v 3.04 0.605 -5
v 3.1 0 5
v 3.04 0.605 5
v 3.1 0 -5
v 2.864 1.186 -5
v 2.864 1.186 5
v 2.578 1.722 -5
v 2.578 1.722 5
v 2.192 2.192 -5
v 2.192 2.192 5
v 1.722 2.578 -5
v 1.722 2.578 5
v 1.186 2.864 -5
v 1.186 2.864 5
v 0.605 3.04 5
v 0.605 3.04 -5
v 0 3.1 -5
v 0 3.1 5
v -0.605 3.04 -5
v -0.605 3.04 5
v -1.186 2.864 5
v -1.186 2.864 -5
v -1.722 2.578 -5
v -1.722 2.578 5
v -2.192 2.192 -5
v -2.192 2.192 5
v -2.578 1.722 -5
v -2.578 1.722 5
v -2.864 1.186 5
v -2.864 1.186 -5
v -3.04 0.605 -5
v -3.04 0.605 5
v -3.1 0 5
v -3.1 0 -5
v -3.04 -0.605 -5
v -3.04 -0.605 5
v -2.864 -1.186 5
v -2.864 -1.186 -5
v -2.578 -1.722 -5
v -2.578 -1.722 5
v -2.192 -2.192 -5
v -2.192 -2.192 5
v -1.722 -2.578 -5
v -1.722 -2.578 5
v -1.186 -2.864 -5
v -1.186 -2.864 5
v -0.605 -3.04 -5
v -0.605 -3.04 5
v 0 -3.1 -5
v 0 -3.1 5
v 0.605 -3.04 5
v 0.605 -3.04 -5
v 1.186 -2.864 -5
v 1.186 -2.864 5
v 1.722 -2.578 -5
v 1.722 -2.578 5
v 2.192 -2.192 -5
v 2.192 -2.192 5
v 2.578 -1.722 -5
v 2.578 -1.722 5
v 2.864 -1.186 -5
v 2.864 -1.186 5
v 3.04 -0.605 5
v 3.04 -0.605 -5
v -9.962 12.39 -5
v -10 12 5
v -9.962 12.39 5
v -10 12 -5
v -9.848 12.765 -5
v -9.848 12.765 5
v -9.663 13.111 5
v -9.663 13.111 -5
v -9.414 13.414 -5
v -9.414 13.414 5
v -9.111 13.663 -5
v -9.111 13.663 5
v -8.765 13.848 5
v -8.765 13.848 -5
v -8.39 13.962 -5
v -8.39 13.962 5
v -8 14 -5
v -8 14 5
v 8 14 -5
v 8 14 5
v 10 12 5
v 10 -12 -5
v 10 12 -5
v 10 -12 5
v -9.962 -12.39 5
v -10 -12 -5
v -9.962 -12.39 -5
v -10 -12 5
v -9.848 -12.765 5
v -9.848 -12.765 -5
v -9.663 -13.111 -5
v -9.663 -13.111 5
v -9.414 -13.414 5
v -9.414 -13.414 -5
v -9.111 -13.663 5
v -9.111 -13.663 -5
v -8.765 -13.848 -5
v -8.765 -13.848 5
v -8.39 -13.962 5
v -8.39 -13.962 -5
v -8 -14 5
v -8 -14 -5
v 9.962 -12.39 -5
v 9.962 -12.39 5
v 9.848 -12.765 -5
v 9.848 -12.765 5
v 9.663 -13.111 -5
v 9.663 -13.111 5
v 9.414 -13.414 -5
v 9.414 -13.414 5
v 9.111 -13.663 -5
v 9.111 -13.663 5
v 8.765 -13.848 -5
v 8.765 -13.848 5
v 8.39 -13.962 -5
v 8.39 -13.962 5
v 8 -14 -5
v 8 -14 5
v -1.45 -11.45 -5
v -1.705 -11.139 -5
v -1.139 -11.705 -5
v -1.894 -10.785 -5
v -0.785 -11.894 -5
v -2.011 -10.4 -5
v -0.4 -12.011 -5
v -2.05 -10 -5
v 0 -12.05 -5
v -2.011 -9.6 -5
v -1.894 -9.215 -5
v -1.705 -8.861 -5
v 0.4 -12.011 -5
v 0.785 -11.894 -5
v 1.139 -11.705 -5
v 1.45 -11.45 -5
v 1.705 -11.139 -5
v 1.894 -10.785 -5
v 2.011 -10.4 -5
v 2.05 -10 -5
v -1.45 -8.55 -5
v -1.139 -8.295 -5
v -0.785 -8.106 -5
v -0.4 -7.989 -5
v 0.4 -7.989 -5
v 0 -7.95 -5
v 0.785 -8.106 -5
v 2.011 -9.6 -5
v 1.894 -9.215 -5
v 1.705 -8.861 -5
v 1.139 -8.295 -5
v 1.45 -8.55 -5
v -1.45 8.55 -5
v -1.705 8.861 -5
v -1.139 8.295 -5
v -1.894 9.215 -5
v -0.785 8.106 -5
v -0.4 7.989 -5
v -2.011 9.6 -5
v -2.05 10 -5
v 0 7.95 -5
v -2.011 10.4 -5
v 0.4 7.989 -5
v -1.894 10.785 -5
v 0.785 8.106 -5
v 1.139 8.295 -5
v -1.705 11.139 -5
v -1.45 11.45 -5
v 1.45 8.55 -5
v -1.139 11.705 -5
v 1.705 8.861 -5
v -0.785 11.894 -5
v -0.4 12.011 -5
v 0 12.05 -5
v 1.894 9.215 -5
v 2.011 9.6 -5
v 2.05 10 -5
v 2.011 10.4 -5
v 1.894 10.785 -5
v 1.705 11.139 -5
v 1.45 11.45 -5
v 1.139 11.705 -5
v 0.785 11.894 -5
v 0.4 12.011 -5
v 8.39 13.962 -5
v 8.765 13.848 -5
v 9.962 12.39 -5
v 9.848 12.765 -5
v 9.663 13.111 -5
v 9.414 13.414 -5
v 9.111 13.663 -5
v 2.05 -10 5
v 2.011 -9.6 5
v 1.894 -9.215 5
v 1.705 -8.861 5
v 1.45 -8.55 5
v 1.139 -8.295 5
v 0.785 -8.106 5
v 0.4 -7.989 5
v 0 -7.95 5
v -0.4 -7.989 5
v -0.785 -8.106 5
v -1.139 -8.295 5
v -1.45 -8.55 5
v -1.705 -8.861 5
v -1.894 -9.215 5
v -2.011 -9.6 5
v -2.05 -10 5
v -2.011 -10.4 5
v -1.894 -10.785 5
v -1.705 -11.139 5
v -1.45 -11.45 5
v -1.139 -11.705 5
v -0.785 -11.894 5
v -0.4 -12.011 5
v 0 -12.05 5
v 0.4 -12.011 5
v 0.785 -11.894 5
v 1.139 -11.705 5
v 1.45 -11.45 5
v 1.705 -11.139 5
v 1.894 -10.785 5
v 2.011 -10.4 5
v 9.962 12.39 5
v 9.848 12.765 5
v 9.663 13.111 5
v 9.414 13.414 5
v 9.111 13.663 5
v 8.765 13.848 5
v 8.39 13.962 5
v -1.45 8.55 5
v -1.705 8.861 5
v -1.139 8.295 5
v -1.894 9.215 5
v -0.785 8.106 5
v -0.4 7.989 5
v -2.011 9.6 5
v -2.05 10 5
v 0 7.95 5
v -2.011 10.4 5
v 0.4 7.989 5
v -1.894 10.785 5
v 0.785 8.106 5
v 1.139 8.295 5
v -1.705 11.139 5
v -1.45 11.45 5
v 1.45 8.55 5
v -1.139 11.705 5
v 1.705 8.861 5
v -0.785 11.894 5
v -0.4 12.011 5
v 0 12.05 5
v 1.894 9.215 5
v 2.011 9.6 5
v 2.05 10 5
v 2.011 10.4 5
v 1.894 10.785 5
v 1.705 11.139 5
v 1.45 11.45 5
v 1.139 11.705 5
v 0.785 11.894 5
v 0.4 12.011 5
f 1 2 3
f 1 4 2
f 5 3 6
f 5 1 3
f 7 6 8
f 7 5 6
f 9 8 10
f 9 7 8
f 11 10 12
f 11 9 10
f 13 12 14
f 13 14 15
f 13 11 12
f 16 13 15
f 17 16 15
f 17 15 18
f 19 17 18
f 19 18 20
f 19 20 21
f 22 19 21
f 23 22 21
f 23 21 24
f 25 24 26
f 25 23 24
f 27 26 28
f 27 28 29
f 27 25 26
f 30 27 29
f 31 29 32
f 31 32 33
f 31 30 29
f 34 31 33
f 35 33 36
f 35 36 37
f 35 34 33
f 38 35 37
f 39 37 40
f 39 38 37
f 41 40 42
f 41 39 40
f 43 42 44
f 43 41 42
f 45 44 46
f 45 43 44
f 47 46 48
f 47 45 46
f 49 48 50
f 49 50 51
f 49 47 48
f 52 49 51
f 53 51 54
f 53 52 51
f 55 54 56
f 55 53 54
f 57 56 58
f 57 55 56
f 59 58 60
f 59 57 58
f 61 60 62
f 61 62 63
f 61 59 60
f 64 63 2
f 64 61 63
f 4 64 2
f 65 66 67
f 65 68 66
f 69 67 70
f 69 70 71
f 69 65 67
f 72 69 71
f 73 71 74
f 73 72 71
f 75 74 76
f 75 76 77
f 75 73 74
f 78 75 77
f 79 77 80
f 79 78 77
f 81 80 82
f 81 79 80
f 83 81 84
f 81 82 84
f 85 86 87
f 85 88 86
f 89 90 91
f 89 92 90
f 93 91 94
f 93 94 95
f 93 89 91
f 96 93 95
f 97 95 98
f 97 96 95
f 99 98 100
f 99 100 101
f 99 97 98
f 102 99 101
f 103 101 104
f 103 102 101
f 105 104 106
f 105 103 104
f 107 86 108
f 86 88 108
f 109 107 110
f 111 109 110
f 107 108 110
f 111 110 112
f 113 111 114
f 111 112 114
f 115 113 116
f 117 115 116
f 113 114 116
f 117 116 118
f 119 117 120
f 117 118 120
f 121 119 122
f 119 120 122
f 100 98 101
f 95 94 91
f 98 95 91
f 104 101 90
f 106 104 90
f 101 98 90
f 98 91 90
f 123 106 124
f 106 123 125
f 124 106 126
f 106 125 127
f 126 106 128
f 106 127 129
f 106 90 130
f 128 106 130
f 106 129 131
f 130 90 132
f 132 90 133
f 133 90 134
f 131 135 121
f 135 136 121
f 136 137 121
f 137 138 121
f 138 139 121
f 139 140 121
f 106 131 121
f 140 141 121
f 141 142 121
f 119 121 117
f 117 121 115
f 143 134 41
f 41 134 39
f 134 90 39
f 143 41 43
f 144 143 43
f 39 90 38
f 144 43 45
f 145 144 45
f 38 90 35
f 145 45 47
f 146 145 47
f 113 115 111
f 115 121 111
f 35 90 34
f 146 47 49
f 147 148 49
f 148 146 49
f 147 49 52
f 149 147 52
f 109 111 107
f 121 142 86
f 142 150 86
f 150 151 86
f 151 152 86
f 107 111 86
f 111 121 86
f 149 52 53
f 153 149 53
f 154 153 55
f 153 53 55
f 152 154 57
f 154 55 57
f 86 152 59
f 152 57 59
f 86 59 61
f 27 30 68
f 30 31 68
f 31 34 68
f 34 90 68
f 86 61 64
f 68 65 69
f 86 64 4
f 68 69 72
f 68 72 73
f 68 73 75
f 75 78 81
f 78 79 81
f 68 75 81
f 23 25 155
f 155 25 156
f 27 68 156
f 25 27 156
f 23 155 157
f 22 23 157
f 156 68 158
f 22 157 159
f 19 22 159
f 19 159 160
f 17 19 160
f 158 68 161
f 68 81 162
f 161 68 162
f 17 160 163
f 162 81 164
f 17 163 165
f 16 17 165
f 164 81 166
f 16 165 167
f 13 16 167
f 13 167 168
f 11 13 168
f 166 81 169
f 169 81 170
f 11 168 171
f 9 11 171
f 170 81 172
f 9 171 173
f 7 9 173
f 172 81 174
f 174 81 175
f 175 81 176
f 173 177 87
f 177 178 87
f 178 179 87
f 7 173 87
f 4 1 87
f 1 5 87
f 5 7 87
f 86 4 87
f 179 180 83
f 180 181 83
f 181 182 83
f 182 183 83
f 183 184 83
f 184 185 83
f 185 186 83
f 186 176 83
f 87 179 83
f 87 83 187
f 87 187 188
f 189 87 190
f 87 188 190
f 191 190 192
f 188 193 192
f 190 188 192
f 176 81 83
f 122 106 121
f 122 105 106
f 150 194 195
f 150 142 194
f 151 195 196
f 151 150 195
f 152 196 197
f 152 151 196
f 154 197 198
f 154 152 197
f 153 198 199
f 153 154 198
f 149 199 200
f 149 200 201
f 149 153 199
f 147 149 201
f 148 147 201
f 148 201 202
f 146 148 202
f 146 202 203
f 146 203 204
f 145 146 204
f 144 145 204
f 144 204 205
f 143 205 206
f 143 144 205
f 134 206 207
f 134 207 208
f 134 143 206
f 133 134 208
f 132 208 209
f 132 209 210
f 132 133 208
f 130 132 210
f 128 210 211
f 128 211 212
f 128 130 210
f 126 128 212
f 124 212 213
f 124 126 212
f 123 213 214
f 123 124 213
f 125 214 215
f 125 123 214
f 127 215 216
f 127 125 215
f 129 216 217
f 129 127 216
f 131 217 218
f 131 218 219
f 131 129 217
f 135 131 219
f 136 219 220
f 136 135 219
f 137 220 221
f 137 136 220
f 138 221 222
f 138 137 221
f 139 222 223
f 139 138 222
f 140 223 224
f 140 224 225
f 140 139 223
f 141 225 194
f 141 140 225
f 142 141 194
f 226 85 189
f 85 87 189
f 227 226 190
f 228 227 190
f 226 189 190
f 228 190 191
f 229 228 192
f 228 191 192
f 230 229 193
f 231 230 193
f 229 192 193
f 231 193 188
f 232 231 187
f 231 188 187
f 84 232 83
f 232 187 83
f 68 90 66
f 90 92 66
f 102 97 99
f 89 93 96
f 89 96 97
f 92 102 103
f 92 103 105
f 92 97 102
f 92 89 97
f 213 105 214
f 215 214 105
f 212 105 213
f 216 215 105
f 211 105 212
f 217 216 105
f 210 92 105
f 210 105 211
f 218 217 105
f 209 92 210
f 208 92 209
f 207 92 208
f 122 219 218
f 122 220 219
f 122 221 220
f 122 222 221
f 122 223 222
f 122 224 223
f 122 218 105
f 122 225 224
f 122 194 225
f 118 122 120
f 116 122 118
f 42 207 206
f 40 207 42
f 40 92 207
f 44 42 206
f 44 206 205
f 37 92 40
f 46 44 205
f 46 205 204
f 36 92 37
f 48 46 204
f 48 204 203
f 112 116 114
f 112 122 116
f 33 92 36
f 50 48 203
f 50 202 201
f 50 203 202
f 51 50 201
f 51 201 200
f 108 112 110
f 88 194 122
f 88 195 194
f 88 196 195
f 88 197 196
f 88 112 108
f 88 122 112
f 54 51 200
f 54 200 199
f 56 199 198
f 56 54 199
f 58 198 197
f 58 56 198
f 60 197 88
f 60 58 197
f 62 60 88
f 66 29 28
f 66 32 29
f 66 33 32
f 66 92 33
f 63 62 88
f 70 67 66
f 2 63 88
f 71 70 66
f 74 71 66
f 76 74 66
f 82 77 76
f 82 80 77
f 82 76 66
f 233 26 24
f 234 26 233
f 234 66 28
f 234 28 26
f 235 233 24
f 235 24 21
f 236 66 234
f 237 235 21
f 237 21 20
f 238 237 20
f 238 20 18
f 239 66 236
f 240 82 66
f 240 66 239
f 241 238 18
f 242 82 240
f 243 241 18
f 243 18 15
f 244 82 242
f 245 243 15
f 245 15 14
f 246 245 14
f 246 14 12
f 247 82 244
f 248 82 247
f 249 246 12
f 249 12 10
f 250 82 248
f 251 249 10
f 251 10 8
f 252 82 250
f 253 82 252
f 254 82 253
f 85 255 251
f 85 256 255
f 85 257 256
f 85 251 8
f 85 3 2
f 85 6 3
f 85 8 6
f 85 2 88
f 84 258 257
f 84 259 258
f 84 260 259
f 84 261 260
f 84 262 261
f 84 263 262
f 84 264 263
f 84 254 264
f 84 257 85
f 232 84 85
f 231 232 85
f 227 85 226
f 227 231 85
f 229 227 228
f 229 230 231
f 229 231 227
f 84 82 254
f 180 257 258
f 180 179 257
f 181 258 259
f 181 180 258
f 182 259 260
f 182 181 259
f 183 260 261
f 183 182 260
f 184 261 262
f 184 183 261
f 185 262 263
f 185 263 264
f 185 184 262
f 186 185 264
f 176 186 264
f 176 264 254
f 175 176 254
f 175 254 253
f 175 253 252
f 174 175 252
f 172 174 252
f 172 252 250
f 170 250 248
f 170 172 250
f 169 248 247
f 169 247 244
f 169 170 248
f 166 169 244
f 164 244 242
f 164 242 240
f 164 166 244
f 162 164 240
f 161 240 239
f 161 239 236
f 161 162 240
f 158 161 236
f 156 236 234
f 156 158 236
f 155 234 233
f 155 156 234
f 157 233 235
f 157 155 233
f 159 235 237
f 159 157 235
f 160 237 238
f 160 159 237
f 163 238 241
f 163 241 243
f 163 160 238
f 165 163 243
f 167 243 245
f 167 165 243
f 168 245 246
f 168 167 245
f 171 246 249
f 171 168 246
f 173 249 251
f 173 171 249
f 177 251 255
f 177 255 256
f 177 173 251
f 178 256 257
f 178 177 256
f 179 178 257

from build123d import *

# Parameters (mm, degrees)
SKETCH_1_W      = 20
SKETCH_1_H      = 28
SKETCH_1_R      = 2.05
SKETCH_1_R_2    = 3.1
EXTRUDE_2_DEPTH = 5
FILLET_1_R      = 2


with BuildPart() as part:
    # 草图1 → 凸台-拉伸2 (new, symmetric)
    with BuildSketch(Plane.XY):
        Rectangle(SKETCH_1_W, SKETCH_1_H)
        with Locations((0, 10)):
            Circle(SKETCH_1_R, mode=Mode.SUBTRACT)
        with Locations((0, -10)):
            Circle(SKETCH_1_R, mode=Mode.SUBTRACT)
        Circle(SKETCH_1_R_2, mode=Mode.SUBTRACT)
    extrude(amount=EXTRUDE_2_DEPTH, both=True)

    # 圆角1
    fillet_1_edges = [part.edges().sort_by_distance(p)[0] for p in [
        (10, -14, 0),
        (-10, -14, 0),
        (-10, 14, 0),
        (10, 14, 0),
    ]]
    fillet(fillet_1_edges, radius=FILLET_1_R)


solid = part.part
